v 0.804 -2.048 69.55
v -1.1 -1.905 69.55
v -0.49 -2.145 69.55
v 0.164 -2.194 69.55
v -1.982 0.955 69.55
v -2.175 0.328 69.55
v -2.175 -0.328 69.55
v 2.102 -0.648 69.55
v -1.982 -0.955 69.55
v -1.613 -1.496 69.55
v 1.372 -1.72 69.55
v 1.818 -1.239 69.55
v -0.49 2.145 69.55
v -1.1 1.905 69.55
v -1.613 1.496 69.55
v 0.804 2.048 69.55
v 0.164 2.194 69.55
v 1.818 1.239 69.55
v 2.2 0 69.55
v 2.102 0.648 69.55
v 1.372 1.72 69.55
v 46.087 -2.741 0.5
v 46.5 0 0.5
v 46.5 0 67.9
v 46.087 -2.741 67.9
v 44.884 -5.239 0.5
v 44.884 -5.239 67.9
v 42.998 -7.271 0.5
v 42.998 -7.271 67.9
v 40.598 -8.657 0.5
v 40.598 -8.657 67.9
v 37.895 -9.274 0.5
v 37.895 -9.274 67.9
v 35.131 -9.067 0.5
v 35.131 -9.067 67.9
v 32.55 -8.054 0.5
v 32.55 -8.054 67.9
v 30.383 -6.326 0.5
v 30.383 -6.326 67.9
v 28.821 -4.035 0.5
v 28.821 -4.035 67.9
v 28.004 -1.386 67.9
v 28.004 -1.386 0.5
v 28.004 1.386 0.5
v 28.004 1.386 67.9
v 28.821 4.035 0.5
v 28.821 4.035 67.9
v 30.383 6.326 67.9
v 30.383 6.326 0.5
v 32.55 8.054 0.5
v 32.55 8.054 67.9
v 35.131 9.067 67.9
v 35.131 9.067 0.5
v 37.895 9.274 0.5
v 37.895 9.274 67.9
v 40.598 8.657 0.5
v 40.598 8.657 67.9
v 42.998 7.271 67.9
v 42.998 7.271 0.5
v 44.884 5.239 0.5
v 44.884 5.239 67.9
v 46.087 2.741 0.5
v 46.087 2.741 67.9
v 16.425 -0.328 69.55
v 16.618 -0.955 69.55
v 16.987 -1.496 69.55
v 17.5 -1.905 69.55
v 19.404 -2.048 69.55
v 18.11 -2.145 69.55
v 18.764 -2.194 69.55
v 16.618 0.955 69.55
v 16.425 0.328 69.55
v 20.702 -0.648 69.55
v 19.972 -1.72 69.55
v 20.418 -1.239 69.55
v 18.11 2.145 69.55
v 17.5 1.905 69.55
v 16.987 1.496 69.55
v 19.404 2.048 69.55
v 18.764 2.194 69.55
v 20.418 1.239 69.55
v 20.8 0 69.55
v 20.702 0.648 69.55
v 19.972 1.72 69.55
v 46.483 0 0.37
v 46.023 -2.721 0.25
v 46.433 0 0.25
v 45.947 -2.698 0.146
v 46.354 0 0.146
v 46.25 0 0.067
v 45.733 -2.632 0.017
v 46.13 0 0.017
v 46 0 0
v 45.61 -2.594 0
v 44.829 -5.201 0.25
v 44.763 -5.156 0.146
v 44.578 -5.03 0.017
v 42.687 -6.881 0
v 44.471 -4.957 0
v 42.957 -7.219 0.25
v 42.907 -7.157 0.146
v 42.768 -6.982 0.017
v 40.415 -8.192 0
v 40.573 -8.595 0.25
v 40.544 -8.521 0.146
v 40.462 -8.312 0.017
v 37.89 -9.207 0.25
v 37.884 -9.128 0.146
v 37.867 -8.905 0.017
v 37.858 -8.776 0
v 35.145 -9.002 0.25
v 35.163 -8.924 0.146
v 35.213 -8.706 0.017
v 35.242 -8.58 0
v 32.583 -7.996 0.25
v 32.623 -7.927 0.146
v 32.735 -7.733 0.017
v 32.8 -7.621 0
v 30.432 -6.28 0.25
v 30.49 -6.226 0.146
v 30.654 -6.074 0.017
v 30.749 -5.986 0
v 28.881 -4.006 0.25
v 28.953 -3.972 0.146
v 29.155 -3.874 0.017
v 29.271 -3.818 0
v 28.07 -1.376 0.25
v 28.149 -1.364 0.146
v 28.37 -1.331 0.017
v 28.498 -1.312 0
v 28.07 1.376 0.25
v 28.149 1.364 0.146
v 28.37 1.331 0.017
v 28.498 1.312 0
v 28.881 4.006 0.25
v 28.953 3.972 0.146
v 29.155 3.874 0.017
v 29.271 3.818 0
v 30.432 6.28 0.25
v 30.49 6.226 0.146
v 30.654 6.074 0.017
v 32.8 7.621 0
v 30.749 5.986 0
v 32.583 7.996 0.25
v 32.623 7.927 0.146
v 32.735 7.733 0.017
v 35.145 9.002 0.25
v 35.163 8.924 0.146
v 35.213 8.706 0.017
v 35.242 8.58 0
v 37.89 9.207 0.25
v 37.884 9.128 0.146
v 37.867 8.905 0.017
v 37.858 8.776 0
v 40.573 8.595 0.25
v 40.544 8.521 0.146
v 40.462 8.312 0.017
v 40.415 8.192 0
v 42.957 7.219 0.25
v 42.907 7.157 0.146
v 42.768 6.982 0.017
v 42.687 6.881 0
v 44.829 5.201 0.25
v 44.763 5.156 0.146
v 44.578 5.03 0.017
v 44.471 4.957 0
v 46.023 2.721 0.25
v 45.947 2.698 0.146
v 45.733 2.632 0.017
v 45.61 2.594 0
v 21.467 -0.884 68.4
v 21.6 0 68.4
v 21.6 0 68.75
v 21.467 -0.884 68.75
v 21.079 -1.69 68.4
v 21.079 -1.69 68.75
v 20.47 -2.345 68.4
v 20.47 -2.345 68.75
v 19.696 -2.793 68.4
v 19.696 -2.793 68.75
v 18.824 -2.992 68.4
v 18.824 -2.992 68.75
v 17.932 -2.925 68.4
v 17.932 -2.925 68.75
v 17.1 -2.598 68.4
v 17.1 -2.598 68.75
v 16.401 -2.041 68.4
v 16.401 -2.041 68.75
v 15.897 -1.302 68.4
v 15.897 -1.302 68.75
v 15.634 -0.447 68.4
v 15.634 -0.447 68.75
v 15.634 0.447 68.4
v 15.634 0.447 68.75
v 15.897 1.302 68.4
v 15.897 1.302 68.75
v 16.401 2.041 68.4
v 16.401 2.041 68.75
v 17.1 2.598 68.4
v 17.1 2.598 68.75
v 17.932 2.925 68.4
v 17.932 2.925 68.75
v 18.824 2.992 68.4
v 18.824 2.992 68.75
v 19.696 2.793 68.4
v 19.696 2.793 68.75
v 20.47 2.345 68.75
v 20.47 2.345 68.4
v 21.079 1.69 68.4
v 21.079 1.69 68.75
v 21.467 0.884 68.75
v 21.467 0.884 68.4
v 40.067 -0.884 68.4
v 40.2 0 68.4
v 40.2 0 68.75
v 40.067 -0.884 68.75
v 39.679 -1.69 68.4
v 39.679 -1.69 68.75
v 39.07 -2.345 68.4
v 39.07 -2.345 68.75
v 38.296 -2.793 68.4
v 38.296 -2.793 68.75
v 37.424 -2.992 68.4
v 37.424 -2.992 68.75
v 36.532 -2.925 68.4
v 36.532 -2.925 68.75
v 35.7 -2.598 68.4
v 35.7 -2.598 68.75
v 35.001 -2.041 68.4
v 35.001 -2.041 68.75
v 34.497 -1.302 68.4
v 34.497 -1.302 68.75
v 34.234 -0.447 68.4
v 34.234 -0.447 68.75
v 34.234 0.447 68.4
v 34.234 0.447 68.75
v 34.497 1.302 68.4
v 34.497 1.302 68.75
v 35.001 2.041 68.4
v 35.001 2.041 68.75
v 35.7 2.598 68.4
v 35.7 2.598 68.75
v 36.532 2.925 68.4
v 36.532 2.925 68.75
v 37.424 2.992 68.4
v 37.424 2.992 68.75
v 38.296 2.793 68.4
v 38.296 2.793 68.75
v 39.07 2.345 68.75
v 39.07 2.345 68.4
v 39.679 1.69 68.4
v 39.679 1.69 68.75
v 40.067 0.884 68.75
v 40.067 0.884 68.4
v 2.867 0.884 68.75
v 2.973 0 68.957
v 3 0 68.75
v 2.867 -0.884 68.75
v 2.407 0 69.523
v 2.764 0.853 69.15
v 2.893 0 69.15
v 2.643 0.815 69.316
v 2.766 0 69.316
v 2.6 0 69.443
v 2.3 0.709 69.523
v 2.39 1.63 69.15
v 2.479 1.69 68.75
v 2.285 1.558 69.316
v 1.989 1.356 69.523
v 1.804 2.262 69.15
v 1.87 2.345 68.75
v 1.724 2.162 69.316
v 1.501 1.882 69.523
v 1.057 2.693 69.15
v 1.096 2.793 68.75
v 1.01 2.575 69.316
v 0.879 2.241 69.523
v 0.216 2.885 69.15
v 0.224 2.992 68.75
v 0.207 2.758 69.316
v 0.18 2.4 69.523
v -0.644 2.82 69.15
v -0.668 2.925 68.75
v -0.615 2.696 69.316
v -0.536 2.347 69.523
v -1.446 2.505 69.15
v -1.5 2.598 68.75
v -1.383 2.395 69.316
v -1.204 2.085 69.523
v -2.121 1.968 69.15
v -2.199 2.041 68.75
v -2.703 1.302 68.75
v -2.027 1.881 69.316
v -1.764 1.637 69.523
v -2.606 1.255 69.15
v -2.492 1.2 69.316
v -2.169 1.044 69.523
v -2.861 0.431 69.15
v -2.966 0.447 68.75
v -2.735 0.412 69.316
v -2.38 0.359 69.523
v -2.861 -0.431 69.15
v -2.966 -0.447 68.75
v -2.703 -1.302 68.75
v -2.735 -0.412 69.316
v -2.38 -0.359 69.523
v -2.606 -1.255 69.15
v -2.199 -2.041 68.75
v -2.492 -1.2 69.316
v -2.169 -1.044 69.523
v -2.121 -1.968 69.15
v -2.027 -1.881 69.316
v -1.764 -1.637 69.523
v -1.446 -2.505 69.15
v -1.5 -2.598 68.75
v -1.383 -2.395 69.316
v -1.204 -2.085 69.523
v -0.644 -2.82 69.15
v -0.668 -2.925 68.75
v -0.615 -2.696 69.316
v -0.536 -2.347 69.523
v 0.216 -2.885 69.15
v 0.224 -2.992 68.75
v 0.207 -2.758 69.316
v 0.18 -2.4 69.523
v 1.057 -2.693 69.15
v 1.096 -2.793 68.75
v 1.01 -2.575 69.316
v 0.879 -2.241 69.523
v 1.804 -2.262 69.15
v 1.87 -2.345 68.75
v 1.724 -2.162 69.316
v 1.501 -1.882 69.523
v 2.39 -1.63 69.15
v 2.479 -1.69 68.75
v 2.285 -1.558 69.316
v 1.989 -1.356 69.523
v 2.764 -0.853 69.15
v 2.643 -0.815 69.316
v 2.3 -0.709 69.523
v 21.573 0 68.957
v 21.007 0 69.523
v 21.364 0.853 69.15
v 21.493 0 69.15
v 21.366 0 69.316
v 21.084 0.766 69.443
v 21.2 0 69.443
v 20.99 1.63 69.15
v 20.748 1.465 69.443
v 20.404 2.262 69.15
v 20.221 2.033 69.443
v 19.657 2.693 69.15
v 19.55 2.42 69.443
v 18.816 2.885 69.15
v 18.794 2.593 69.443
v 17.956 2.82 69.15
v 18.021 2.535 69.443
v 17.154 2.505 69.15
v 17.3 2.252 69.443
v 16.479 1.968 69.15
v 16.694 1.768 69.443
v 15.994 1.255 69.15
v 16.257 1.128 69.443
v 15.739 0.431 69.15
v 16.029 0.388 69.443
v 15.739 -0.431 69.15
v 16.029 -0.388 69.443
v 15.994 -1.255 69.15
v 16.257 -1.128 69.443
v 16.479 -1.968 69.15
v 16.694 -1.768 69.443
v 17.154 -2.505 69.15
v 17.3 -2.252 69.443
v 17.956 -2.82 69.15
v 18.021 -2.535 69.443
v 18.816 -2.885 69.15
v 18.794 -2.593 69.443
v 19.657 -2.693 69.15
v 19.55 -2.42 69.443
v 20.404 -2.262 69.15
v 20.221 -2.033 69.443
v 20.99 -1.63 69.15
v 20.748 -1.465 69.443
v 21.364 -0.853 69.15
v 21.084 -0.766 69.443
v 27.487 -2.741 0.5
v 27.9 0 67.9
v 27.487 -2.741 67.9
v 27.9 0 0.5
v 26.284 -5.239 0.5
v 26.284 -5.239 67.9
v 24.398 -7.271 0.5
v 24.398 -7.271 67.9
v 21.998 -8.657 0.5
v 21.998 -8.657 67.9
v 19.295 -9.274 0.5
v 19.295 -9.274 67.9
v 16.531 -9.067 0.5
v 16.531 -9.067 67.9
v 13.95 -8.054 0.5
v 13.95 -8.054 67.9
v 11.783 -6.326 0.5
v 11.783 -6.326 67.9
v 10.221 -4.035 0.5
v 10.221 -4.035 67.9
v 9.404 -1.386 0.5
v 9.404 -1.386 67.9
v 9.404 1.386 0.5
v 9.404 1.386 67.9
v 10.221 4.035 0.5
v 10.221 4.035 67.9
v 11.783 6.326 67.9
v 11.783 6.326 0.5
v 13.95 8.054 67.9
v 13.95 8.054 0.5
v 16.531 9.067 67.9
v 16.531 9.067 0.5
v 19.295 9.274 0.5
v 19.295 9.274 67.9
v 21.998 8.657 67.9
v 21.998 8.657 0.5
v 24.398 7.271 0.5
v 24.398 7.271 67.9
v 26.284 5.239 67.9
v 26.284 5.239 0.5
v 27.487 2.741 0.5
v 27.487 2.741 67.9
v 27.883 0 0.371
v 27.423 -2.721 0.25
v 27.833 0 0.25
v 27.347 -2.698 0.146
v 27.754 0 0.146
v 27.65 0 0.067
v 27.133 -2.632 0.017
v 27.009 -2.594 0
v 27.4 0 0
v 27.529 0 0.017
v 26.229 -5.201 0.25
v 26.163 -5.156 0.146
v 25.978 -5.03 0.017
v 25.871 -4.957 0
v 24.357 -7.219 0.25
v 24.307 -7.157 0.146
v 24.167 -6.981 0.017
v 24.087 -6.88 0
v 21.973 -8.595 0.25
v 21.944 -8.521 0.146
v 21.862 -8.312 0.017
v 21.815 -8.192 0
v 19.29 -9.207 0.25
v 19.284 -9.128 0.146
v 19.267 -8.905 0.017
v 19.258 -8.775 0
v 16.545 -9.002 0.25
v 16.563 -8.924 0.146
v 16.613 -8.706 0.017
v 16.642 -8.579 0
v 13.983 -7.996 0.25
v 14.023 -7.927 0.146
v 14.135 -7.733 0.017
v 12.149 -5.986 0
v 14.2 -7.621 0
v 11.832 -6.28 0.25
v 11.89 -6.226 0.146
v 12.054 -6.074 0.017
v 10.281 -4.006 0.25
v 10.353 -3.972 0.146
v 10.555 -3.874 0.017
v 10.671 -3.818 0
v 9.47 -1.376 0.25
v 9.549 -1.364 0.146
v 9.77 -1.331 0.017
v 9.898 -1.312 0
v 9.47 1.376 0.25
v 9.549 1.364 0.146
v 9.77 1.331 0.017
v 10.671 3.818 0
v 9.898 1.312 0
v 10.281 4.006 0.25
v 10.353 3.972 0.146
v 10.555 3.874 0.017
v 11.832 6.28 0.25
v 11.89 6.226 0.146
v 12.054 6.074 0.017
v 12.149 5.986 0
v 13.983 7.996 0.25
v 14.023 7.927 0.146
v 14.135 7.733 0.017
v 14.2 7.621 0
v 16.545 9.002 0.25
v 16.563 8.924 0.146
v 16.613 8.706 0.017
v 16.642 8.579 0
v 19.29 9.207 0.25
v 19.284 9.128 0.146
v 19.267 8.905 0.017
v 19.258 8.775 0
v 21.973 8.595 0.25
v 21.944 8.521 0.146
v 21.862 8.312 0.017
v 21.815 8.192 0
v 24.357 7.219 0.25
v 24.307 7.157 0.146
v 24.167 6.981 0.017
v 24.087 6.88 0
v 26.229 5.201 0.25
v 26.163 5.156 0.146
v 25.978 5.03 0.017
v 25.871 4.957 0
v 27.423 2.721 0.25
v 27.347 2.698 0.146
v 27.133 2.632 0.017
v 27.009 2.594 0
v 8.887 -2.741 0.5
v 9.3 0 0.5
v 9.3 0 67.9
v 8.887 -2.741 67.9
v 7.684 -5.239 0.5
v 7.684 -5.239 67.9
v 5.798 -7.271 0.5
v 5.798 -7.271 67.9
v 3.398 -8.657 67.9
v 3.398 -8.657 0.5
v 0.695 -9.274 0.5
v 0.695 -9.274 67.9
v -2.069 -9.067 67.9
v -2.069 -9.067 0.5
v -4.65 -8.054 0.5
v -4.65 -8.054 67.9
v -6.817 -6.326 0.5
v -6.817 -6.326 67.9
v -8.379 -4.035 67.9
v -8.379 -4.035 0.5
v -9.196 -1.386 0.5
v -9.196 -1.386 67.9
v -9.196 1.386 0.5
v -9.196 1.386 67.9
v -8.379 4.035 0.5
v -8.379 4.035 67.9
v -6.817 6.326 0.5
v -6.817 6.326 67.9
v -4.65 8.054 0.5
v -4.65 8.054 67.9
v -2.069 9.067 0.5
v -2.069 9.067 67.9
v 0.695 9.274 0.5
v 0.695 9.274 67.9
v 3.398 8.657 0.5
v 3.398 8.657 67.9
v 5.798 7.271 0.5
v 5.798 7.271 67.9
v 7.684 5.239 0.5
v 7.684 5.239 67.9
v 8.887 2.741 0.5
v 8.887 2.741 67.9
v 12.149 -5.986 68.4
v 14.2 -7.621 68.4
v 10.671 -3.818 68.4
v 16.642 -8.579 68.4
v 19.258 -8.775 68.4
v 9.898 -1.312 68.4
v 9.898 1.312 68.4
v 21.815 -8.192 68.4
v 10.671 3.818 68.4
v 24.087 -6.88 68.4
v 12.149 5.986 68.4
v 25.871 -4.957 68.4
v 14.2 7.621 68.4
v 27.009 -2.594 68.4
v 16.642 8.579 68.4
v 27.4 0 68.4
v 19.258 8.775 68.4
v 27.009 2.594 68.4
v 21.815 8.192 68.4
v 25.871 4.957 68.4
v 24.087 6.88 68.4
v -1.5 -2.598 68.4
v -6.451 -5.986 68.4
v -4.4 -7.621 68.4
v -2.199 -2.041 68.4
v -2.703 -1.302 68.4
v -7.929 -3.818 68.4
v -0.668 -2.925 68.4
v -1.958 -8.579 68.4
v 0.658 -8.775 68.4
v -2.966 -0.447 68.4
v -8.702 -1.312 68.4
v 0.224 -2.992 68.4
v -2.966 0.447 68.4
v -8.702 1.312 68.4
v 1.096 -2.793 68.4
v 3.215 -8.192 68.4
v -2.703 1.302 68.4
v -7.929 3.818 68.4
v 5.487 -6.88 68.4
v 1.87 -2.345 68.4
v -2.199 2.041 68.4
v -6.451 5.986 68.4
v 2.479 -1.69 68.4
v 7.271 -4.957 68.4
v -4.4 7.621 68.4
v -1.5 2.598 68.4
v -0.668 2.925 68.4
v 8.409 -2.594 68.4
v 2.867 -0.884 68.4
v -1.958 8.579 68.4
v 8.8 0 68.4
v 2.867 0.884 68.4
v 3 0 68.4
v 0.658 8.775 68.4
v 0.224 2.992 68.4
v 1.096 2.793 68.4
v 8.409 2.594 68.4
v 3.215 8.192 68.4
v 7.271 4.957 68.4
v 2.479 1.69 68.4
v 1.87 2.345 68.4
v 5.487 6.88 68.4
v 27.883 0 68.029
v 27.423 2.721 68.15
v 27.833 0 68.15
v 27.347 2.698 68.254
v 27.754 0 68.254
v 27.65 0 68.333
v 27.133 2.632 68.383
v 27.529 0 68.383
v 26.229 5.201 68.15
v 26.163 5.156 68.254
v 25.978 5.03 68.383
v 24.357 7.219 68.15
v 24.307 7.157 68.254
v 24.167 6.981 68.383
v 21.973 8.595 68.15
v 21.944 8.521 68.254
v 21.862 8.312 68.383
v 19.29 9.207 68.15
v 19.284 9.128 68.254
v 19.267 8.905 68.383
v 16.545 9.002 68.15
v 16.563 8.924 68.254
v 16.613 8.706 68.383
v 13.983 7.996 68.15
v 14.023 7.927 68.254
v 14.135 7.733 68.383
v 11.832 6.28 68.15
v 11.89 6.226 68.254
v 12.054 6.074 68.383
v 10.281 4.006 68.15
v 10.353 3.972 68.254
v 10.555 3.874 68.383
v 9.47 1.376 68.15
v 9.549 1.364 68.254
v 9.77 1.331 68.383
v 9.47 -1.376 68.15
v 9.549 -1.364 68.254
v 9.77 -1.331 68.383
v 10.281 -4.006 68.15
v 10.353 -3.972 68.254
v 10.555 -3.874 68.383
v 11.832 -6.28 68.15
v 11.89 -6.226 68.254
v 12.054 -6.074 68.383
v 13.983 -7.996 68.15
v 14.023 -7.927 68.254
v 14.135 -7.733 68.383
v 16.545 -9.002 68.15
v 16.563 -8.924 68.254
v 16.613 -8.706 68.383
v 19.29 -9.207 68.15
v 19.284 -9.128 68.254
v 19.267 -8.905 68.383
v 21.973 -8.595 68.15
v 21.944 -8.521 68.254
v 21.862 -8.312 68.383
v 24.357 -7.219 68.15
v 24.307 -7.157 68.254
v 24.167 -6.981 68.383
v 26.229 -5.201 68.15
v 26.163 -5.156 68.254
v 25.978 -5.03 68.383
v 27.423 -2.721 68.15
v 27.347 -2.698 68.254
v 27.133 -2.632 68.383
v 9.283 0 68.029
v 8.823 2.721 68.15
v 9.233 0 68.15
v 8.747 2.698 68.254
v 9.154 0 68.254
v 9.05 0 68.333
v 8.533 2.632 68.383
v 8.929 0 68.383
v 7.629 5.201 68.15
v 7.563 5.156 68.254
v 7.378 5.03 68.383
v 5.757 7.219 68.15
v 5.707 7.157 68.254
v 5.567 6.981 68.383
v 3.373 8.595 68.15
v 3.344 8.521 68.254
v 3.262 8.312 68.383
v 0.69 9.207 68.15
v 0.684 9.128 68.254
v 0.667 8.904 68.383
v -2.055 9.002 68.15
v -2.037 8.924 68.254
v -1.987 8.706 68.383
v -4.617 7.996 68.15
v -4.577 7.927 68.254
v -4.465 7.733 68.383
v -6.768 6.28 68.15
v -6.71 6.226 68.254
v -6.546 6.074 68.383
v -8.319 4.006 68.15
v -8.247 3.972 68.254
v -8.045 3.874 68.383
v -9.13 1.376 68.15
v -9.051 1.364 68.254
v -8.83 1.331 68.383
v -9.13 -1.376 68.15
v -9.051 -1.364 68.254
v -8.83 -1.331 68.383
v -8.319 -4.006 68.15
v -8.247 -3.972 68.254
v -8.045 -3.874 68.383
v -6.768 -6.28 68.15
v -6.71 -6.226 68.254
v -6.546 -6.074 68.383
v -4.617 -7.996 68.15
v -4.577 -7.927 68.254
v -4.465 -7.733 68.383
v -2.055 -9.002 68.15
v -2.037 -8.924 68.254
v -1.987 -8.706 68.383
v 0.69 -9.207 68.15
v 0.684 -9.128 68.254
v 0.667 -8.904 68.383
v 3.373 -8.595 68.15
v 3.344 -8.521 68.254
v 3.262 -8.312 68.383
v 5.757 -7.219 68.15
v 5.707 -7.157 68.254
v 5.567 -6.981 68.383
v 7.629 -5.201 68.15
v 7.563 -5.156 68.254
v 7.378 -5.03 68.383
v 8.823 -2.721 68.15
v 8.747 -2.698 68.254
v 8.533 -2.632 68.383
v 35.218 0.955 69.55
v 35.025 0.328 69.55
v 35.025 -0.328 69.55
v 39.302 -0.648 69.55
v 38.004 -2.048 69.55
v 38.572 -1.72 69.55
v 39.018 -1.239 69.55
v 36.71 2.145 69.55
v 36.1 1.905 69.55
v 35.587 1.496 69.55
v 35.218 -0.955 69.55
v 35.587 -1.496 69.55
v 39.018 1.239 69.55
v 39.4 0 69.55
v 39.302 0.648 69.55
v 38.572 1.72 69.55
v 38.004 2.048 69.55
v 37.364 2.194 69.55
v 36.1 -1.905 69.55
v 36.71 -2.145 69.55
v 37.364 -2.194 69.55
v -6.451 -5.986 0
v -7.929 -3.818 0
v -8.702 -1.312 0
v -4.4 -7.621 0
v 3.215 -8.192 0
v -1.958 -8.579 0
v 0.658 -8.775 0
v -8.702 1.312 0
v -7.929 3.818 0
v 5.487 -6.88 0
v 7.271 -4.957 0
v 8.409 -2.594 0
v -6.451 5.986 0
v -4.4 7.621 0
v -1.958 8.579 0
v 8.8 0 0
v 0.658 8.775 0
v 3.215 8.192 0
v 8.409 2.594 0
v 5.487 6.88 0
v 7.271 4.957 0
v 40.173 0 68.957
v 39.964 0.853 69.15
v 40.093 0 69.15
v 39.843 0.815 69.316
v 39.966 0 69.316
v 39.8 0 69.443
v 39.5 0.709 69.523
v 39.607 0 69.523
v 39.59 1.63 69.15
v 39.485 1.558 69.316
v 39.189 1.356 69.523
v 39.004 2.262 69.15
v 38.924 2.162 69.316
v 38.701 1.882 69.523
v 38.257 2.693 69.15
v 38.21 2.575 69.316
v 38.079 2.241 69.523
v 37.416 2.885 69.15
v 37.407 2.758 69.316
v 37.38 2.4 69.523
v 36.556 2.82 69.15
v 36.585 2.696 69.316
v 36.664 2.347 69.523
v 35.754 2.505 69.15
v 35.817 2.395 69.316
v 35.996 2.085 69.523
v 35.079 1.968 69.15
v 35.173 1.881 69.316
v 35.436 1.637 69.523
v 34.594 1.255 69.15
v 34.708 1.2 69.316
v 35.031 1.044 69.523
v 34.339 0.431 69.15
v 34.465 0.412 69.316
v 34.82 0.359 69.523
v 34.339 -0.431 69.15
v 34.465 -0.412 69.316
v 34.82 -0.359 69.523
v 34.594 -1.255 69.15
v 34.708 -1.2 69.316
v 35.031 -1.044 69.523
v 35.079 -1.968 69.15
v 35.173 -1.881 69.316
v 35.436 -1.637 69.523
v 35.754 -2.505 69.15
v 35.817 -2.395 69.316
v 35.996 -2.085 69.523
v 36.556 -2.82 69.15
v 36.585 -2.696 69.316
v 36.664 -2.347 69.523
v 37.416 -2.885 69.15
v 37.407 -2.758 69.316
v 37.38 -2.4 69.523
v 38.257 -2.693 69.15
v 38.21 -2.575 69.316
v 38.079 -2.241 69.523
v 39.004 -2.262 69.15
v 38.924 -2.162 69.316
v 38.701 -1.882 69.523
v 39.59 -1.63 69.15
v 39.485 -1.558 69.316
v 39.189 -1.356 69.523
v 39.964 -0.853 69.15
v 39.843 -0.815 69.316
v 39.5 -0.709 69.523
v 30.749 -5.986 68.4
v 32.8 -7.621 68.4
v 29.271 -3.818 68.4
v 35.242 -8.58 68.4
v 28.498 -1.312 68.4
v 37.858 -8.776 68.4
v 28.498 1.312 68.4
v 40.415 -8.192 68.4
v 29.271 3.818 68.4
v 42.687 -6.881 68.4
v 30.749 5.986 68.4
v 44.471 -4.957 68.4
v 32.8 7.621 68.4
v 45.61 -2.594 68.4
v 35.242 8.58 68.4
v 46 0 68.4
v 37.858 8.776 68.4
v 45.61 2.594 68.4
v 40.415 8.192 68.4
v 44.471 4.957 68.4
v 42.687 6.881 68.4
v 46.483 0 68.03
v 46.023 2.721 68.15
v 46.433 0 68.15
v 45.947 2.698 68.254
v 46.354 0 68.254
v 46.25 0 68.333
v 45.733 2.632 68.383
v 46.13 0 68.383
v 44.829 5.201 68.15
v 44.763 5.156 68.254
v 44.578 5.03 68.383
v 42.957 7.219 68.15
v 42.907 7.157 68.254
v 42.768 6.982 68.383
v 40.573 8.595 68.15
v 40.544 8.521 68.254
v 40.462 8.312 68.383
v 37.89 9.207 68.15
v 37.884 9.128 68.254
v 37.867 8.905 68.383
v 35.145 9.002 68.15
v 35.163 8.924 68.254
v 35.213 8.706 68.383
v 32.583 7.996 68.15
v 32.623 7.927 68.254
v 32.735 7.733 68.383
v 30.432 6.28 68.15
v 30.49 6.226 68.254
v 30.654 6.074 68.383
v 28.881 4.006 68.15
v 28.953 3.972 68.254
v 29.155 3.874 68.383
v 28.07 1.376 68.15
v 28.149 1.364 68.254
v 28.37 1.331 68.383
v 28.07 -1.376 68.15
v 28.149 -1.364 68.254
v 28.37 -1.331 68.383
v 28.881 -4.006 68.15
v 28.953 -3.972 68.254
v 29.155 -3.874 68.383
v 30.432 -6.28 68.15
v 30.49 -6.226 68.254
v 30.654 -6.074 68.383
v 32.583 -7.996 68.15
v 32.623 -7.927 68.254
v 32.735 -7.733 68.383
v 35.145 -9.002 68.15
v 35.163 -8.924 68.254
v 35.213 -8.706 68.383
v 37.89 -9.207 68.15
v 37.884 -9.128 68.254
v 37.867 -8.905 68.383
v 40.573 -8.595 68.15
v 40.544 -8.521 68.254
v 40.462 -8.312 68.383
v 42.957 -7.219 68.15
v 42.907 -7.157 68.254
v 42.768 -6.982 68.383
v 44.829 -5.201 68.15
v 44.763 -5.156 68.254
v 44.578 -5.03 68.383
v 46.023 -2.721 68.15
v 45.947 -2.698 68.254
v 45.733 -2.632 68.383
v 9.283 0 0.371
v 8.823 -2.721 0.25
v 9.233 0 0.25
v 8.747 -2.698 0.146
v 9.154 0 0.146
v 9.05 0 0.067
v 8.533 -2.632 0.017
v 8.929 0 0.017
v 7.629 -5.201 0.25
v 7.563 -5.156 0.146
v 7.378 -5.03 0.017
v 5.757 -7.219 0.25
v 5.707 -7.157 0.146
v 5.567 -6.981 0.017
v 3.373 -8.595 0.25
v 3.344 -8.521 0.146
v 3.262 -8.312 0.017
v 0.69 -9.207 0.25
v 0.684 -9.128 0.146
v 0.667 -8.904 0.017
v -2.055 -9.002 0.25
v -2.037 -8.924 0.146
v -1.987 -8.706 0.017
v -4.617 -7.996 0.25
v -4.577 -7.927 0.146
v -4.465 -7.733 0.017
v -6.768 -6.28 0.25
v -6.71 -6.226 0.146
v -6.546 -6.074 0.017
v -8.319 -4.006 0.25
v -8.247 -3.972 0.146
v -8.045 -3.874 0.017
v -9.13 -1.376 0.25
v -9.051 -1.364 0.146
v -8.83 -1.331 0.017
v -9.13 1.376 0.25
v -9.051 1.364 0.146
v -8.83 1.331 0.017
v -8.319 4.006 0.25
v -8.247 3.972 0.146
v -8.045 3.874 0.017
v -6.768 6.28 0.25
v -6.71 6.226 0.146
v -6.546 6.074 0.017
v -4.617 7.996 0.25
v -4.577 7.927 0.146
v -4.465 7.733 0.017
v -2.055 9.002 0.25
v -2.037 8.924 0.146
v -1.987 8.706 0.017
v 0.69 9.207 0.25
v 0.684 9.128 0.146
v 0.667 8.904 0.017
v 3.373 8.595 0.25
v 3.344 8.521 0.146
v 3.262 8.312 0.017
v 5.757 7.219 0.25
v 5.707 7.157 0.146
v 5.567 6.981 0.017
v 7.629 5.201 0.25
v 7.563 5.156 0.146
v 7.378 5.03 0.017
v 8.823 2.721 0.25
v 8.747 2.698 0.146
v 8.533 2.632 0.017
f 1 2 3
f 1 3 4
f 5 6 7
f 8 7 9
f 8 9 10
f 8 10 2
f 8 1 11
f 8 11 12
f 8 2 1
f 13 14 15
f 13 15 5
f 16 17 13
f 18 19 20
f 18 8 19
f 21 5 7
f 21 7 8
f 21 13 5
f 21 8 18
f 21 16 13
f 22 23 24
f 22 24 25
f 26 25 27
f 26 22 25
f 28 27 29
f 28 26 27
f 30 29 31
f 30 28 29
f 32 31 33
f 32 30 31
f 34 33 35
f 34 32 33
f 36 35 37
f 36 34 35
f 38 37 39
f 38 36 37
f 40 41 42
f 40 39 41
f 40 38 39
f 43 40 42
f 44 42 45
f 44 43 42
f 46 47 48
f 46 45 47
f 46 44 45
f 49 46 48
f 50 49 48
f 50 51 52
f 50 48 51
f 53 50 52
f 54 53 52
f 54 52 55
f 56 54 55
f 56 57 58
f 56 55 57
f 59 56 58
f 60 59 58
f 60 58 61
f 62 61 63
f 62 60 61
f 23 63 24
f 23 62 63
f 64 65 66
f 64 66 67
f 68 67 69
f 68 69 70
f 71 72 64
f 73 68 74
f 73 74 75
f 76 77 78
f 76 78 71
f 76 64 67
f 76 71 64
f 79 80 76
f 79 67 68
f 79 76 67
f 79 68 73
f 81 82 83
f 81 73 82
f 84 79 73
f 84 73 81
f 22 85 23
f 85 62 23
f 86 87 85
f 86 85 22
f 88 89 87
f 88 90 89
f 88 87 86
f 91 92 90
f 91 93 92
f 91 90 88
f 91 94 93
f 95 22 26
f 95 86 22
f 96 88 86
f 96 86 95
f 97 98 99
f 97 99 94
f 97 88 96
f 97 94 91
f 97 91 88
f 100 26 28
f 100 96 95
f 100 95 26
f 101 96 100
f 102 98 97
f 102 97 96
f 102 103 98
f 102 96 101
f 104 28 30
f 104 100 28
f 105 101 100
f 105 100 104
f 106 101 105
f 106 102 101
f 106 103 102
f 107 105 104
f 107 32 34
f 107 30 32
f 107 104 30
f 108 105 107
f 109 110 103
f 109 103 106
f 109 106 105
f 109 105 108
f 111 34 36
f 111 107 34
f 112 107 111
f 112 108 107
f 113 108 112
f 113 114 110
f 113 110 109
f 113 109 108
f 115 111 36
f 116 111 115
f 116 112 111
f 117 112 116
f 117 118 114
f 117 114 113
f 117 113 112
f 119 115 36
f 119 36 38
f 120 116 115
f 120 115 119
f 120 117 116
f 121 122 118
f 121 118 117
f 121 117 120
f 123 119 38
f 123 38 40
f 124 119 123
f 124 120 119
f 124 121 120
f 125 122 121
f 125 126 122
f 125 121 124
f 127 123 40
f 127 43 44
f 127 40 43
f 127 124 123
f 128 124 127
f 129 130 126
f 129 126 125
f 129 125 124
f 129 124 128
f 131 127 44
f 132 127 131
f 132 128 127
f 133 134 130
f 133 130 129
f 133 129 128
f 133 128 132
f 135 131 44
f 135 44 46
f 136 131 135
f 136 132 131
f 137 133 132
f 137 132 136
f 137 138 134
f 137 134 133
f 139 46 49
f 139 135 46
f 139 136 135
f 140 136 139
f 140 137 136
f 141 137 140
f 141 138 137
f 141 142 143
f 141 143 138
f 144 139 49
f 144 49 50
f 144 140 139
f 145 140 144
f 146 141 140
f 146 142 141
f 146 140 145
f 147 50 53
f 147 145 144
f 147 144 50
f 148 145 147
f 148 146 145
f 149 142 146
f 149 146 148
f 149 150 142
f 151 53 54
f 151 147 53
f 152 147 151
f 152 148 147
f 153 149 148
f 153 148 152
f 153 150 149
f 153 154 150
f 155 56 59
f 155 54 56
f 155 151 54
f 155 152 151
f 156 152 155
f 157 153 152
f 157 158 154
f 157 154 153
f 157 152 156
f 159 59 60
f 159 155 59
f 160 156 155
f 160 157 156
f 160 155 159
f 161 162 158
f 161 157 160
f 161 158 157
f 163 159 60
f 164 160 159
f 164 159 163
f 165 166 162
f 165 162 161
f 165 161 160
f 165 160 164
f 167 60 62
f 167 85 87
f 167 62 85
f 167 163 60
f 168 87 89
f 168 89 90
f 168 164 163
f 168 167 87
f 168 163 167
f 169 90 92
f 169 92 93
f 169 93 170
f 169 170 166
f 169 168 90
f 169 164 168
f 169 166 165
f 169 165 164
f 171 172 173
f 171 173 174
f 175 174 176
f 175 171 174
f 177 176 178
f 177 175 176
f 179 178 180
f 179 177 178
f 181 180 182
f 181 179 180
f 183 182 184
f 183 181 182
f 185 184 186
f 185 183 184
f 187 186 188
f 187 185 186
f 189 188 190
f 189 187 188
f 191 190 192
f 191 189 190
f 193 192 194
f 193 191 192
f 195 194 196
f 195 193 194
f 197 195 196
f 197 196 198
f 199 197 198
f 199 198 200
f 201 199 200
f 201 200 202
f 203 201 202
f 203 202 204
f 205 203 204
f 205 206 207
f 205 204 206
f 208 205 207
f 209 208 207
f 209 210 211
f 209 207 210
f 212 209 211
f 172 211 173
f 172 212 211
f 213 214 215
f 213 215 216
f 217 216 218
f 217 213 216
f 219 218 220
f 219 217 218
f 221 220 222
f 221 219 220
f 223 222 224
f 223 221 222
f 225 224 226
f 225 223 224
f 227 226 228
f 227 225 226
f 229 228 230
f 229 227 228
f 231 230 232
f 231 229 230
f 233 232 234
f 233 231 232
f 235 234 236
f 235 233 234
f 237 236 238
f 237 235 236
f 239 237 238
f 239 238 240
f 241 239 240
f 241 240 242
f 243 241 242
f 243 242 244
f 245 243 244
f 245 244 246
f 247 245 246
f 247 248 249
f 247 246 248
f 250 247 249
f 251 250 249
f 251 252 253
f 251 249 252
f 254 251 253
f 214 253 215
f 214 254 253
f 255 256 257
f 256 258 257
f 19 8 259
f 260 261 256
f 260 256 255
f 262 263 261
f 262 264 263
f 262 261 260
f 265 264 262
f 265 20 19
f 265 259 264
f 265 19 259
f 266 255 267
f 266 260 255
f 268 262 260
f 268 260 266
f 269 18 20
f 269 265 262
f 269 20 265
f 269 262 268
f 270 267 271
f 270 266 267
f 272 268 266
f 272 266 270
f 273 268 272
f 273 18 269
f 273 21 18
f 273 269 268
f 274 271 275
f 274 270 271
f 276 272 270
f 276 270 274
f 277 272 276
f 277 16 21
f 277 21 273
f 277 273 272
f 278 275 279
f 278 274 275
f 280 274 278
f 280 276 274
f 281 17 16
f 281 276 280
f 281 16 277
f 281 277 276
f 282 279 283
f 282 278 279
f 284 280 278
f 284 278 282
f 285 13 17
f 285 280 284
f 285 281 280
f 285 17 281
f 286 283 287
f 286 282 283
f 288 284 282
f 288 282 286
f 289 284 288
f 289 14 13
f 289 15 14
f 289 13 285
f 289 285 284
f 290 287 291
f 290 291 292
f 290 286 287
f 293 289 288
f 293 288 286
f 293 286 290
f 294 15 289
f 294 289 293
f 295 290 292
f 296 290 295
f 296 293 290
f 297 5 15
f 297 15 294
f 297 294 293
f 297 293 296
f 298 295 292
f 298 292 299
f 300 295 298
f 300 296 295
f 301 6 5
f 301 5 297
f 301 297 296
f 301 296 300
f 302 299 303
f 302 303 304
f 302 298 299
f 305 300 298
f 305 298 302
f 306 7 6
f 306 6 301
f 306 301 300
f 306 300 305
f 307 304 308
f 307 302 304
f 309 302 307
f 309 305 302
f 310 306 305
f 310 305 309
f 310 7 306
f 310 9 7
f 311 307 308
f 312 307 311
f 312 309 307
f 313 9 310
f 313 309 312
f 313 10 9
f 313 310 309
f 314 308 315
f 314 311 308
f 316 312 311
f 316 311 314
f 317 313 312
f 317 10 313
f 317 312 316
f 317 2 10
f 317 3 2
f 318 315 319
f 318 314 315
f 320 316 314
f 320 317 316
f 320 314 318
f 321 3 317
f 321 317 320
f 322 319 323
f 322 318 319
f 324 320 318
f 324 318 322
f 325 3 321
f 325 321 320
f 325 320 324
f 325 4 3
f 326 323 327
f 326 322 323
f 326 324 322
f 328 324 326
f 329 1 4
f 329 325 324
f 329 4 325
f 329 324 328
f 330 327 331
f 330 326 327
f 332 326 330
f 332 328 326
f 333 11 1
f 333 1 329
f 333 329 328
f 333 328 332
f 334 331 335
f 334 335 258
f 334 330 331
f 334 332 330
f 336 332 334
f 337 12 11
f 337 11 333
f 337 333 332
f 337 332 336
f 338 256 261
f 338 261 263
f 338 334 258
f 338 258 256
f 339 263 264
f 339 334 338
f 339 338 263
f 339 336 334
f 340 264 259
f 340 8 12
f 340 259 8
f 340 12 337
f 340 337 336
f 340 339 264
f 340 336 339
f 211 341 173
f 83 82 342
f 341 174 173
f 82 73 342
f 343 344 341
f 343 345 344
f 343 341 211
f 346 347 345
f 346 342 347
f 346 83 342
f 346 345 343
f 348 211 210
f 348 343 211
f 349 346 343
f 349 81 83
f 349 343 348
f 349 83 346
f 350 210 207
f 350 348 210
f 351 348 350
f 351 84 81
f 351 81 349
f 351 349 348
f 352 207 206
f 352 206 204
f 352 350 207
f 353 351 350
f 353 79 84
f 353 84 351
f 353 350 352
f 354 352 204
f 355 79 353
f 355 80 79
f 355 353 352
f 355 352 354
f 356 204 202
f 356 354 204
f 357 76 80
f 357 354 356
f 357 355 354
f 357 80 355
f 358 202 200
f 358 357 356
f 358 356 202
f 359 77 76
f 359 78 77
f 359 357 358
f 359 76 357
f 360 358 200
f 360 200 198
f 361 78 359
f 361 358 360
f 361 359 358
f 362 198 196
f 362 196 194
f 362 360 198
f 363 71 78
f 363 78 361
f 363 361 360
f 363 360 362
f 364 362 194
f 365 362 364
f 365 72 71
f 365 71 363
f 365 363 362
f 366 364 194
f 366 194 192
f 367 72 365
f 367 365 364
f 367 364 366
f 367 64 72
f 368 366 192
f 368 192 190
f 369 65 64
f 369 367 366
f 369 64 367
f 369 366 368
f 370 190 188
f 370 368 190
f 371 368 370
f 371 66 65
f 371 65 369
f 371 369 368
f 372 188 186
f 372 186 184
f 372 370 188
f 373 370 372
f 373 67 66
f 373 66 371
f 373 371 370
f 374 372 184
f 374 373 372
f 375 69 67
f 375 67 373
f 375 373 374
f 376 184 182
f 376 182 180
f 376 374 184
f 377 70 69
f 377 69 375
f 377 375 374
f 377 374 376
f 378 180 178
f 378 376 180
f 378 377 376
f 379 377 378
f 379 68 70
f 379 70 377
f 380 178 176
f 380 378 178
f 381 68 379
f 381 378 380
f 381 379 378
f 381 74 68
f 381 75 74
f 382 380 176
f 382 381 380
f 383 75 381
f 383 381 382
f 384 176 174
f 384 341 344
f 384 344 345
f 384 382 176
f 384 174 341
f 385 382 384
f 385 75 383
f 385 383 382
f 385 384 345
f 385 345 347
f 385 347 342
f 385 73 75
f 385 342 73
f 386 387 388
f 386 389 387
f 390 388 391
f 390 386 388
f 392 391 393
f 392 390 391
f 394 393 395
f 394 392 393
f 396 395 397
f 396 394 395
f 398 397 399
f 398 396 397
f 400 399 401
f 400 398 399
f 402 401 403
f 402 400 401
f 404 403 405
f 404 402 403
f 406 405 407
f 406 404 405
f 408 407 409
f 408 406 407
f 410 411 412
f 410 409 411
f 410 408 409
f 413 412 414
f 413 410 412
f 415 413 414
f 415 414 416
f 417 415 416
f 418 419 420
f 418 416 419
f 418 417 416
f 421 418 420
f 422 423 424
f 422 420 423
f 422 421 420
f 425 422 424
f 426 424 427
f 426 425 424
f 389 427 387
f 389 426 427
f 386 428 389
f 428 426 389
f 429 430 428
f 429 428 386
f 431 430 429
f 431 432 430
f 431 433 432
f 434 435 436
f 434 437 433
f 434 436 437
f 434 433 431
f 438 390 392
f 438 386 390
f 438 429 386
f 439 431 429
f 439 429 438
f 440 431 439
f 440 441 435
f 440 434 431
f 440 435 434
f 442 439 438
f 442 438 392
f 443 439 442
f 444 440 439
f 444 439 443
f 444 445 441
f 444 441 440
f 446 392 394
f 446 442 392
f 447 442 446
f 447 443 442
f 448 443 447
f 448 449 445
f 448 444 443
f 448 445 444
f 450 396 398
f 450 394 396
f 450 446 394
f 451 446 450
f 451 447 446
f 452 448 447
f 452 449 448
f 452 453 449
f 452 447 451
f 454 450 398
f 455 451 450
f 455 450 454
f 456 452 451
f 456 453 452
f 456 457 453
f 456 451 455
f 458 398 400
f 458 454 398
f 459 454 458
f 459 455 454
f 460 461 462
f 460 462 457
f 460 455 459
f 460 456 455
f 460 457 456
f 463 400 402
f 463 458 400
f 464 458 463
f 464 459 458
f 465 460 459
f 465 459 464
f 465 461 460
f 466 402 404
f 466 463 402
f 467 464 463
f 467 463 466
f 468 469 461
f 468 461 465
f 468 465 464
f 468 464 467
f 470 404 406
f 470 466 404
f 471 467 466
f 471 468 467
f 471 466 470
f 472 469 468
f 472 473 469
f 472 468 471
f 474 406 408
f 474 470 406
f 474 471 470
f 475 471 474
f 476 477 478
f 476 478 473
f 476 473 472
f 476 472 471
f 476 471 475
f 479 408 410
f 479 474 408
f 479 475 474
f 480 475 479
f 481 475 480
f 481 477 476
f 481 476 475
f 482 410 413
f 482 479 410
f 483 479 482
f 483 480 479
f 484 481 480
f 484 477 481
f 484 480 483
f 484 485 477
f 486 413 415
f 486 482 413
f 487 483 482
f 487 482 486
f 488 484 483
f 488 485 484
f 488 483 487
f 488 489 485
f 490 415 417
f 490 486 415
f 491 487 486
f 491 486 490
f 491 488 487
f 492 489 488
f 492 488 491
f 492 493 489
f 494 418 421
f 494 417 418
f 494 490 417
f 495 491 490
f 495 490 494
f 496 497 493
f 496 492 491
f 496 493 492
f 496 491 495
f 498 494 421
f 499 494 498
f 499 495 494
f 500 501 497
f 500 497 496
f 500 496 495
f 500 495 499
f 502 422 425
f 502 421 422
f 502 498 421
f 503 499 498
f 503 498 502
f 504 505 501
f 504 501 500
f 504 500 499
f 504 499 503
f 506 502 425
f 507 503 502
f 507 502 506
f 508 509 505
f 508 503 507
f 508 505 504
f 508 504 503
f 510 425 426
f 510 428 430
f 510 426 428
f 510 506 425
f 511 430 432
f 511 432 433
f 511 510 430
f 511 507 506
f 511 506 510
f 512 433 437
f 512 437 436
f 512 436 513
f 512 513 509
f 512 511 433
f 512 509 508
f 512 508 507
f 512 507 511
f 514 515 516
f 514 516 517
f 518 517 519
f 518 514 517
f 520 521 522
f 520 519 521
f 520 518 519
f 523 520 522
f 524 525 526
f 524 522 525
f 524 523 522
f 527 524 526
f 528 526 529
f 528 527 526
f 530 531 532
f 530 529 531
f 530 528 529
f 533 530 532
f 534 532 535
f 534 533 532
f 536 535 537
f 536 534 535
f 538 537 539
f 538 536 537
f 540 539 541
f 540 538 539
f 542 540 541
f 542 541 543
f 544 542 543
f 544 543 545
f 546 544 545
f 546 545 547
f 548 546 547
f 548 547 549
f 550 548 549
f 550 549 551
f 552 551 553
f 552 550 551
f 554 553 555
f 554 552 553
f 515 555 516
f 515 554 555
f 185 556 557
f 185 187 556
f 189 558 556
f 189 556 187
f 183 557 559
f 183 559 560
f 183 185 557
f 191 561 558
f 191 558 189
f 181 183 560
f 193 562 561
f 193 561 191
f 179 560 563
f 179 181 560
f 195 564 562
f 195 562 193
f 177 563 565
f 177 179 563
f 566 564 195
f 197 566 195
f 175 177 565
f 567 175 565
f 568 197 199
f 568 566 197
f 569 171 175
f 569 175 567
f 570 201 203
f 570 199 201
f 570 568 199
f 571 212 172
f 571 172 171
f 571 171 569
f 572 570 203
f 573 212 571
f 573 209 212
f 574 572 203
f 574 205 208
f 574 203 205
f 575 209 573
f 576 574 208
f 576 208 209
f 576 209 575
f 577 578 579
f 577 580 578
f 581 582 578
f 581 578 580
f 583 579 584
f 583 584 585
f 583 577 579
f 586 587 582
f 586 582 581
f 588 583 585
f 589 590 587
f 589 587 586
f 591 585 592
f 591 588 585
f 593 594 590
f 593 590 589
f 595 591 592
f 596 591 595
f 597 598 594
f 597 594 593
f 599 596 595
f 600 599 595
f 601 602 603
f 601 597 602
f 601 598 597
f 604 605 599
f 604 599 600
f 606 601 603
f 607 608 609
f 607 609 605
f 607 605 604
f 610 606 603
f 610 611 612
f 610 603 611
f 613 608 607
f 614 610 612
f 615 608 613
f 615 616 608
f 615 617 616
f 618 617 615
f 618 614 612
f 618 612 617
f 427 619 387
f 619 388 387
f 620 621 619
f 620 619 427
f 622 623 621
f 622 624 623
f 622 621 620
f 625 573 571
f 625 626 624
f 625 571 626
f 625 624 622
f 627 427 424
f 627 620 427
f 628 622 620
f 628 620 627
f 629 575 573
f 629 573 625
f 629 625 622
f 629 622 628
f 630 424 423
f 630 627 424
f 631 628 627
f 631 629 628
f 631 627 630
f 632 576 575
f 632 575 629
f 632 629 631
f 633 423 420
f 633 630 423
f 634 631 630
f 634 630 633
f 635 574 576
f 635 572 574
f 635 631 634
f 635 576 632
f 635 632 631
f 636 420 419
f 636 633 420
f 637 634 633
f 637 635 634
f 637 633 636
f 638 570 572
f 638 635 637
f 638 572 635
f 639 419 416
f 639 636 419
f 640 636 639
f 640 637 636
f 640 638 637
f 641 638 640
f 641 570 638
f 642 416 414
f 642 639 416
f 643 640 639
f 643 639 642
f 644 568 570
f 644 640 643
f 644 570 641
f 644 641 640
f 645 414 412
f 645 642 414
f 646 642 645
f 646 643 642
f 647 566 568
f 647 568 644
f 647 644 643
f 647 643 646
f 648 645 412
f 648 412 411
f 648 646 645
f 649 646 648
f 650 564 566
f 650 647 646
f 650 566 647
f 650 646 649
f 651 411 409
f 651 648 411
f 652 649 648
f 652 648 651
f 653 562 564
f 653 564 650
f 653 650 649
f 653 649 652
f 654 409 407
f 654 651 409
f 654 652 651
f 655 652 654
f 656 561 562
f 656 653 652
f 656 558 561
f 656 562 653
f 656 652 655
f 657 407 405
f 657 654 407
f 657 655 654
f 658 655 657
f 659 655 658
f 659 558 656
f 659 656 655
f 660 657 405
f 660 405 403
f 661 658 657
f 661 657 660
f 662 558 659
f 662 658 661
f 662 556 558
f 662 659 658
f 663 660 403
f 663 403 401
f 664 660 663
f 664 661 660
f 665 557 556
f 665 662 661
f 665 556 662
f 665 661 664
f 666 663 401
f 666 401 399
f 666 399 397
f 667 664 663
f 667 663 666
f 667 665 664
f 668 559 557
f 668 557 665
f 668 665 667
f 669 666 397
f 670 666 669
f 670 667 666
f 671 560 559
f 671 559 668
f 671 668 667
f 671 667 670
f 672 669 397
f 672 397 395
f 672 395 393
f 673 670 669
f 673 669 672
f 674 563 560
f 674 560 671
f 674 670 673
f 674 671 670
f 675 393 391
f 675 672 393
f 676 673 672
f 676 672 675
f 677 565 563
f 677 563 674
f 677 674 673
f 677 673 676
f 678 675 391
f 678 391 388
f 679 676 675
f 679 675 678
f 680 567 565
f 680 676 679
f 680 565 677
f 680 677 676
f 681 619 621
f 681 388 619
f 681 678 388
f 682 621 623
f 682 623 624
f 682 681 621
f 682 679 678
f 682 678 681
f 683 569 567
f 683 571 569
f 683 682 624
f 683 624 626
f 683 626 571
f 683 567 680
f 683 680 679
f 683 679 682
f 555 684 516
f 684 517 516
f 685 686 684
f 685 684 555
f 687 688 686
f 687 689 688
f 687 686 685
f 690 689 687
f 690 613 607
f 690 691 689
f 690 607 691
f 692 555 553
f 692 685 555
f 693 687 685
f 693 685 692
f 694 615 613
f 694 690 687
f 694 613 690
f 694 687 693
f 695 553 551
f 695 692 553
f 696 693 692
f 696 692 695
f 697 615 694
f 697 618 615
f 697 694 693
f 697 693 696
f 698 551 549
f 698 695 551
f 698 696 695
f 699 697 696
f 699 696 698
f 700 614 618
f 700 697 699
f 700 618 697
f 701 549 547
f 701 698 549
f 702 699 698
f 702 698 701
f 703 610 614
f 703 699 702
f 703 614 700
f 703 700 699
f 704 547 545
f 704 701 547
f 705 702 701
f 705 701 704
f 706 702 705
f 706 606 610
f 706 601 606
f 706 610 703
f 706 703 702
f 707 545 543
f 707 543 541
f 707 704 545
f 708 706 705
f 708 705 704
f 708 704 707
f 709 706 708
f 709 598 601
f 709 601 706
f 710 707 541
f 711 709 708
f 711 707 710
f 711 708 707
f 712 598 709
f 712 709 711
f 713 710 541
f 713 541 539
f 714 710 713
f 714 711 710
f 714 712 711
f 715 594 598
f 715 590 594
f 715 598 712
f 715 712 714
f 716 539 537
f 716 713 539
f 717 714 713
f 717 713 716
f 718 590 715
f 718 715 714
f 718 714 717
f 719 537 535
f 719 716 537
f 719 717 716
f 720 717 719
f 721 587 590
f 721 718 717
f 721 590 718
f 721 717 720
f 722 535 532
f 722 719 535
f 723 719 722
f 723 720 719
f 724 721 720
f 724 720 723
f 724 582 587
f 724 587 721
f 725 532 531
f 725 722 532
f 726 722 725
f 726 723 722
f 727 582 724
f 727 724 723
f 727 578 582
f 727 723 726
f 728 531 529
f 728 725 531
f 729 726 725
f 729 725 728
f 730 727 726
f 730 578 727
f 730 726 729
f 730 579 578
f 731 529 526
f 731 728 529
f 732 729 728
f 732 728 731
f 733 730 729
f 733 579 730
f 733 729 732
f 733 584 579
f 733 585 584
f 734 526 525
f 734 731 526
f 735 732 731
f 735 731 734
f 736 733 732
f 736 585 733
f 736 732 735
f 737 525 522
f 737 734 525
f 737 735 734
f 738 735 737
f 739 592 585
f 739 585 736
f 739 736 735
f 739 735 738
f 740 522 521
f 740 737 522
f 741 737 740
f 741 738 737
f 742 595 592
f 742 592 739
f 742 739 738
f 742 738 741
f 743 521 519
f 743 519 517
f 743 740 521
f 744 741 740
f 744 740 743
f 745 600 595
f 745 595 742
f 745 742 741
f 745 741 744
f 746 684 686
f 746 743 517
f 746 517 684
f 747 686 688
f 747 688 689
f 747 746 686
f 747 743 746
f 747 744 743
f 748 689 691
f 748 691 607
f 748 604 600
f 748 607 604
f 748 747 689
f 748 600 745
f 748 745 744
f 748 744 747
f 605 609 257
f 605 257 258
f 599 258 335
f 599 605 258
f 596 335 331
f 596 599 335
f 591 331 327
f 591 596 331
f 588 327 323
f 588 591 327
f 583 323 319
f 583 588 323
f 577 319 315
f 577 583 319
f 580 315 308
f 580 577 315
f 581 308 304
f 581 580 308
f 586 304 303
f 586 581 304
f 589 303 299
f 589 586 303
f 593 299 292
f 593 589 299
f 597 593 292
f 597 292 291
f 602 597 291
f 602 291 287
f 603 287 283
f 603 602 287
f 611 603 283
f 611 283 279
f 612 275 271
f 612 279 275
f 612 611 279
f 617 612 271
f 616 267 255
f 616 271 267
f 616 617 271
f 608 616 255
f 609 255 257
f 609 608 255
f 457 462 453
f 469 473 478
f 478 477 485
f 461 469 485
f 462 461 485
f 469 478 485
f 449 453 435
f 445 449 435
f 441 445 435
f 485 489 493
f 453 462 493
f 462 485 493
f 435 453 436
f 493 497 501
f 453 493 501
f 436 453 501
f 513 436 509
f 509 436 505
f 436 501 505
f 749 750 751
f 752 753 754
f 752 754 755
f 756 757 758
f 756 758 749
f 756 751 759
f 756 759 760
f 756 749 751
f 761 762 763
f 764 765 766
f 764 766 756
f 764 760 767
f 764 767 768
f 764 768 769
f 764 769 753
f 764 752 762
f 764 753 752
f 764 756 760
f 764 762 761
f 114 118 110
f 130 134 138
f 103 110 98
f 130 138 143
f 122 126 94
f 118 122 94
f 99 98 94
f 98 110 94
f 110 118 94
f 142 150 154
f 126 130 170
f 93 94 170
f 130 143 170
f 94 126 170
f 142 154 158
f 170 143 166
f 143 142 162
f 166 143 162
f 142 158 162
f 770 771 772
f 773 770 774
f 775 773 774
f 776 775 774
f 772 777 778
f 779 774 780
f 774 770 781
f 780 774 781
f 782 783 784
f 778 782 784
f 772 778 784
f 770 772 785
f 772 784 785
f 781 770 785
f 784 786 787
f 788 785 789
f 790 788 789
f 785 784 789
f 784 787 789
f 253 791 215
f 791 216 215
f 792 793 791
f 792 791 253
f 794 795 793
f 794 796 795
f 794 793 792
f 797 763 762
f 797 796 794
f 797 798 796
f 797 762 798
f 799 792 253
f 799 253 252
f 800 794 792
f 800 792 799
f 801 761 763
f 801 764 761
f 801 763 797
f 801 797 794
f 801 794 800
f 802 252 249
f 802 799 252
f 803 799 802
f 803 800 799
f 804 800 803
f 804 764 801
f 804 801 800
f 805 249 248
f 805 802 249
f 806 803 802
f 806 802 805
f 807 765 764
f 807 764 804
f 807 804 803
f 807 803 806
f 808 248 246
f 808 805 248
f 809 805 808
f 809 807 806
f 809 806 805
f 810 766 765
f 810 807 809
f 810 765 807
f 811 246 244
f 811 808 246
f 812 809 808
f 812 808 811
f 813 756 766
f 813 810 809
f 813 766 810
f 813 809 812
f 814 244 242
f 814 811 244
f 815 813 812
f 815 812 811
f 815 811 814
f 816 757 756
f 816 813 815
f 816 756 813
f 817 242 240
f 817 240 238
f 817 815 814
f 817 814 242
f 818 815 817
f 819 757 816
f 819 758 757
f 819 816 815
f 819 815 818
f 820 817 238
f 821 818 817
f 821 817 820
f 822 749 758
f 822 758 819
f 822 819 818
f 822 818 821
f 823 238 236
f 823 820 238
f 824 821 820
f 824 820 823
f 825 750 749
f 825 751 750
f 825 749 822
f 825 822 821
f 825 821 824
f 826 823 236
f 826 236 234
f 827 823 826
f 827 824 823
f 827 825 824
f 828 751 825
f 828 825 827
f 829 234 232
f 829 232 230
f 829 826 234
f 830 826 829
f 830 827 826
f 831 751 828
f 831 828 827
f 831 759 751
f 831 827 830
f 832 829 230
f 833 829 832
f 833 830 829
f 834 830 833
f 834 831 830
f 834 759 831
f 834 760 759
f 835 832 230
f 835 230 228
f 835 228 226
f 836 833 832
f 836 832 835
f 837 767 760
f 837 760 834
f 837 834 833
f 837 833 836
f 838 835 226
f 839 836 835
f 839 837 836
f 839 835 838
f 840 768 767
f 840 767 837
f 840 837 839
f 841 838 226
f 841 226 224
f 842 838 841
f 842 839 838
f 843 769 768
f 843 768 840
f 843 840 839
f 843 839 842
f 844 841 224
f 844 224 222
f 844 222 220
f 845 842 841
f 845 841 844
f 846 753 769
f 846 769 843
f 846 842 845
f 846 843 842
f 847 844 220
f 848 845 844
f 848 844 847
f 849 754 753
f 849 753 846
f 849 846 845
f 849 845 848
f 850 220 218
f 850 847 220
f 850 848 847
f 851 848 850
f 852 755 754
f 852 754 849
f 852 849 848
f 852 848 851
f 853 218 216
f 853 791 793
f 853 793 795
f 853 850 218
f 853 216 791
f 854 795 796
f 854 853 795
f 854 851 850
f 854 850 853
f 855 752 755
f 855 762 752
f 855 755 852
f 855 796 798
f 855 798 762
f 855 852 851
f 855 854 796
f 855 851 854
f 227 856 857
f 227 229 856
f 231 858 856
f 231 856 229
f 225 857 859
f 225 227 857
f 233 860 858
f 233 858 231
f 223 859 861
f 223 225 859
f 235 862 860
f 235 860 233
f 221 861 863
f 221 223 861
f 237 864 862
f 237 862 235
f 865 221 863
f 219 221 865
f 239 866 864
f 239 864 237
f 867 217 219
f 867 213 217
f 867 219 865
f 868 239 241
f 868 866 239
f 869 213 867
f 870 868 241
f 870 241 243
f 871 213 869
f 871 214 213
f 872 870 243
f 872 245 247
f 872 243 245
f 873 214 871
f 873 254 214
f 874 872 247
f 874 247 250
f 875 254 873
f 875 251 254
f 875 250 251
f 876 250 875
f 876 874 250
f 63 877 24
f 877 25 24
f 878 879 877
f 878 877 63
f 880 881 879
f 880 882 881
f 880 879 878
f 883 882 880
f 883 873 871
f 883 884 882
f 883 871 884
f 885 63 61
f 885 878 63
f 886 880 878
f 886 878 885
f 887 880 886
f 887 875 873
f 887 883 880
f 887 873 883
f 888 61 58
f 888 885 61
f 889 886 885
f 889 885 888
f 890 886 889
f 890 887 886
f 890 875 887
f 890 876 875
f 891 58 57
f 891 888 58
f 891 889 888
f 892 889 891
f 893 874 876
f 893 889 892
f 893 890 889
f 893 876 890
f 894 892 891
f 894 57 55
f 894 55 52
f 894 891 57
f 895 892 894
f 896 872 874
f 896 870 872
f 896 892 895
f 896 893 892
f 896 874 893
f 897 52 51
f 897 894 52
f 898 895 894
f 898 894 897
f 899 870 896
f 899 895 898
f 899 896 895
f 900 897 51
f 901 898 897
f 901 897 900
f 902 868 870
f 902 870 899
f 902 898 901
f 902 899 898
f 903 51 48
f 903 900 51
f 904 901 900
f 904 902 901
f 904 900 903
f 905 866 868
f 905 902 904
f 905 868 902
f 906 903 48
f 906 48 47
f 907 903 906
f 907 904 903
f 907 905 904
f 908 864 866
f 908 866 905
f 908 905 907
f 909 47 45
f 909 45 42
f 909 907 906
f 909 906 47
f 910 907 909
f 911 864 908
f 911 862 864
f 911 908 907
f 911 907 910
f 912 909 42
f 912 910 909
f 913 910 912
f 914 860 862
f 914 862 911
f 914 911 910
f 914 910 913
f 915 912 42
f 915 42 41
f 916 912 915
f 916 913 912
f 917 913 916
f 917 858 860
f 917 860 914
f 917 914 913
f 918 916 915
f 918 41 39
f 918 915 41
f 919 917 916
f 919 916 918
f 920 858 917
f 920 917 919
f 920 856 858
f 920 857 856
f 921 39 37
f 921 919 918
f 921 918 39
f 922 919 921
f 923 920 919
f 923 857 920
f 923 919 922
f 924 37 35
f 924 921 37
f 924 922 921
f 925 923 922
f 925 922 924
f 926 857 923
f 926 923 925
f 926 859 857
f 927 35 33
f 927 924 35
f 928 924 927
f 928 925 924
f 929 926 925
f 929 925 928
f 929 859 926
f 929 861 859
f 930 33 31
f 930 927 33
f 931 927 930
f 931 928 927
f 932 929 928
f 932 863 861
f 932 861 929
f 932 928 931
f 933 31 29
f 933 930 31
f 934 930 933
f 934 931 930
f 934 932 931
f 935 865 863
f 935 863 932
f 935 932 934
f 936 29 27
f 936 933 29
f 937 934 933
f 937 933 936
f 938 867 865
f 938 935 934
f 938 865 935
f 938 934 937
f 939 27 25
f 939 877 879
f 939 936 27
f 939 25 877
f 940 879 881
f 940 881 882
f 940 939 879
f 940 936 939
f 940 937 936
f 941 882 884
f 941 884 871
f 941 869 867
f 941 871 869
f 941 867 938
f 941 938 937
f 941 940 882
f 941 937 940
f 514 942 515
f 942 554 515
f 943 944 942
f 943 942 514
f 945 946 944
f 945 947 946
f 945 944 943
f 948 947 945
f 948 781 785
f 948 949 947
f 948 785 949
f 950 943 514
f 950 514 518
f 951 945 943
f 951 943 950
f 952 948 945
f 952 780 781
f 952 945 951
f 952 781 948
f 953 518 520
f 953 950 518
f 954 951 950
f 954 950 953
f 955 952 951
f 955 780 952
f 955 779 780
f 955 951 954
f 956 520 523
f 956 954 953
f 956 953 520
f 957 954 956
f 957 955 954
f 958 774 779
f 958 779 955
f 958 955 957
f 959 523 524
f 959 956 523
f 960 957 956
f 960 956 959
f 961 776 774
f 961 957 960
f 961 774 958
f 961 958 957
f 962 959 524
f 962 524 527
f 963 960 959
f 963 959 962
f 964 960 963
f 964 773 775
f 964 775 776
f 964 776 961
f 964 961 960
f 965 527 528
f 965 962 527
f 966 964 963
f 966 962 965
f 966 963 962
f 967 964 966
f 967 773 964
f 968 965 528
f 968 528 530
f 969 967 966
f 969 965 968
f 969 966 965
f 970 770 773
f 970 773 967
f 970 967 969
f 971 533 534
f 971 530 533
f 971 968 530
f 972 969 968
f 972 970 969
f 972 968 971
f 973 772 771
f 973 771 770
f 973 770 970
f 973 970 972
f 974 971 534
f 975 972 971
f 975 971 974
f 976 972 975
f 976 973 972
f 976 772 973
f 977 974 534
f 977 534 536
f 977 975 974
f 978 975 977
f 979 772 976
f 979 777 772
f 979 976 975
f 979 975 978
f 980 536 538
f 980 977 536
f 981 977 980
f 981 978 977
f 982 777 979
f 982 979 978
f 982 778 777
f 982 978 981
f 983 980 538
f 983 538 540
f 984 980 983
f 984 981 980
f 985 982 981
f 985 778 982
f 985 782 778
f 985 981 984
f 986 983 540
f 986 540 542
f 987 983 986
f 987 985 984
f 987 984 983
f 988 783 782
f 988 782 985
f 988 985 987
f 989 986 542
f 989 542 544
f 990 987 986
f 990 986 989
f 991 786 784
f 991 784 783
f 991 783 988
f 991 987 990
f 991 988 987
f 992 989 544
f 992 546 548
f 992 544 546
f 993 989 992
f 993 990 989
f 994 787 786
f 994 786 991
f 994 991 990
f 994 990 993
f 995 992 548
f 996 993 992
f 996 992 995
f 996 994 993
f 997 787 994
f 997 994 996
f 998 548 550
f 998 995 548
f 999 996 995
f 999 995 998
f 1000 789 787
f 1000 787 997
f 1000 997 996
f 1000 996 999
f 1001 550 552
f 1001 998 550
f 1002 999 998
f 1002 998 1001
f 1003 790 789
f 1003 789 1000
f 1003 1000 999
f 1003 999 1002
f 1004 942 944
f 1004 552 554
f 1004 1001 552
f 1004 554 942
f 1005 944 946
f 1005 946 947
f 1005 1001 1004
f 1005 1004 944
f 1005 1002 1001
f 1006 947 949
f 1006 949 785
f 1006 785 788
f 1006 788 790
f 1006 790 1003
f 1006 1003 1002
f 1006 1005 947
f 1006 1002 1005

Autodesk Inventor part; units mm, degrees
ref_plane "YZ Plane" through (0, 0, 0) normal (1, 0, 0) x (0, 1, 0)
ref_plane "XZ Plane" through (0, 0, 0) normal (0, 1, 0) x (-1, 0, 0)
ref_plane "XY Plane" through (0, 0, 0) normal (0, 0, 1) x (1, 0, 0)
sketch "스케치1" plane through (0, 0, 0) normal (0, 0, 1) x (1, 0, 0)
  circle A0 centre (0, 0) radius 9.3
  dimension "d0" = 18.6
extrude "돌출1" add sketch "스케치1" along normal blind 68.4
fillet "모깎기1" radius 0.5 2 edges at (-9.3, 0, 68.4) (-9.3, 0, 0)
sketch "스케치4" plane through (0, 0, 68.4) normal (0, 0, 1) x (1, 0, 0)
  circle A0 centre (0, 0) radius 3
  dimension "d11" = 6
extrude "돌출3" add sketch "스케치4" along normal blind 1.15
fillet "모깎기3" radius 0.8 1 edges at (-3, 0, 69.55)
pattern_linear "직사각형 패턴2" count 3 spacing 18.6 along (1, 0, 0) of "돌출1", "모깎기3", "돌출3", "모깎기1"
sketch "스케치5" plane through (0, 0, 68.4) normal (0, 0, 1) x (1, 0, 0)
  line L0 (0, 0) -> (7.6337, 0)
properties part number "18650배터리"
